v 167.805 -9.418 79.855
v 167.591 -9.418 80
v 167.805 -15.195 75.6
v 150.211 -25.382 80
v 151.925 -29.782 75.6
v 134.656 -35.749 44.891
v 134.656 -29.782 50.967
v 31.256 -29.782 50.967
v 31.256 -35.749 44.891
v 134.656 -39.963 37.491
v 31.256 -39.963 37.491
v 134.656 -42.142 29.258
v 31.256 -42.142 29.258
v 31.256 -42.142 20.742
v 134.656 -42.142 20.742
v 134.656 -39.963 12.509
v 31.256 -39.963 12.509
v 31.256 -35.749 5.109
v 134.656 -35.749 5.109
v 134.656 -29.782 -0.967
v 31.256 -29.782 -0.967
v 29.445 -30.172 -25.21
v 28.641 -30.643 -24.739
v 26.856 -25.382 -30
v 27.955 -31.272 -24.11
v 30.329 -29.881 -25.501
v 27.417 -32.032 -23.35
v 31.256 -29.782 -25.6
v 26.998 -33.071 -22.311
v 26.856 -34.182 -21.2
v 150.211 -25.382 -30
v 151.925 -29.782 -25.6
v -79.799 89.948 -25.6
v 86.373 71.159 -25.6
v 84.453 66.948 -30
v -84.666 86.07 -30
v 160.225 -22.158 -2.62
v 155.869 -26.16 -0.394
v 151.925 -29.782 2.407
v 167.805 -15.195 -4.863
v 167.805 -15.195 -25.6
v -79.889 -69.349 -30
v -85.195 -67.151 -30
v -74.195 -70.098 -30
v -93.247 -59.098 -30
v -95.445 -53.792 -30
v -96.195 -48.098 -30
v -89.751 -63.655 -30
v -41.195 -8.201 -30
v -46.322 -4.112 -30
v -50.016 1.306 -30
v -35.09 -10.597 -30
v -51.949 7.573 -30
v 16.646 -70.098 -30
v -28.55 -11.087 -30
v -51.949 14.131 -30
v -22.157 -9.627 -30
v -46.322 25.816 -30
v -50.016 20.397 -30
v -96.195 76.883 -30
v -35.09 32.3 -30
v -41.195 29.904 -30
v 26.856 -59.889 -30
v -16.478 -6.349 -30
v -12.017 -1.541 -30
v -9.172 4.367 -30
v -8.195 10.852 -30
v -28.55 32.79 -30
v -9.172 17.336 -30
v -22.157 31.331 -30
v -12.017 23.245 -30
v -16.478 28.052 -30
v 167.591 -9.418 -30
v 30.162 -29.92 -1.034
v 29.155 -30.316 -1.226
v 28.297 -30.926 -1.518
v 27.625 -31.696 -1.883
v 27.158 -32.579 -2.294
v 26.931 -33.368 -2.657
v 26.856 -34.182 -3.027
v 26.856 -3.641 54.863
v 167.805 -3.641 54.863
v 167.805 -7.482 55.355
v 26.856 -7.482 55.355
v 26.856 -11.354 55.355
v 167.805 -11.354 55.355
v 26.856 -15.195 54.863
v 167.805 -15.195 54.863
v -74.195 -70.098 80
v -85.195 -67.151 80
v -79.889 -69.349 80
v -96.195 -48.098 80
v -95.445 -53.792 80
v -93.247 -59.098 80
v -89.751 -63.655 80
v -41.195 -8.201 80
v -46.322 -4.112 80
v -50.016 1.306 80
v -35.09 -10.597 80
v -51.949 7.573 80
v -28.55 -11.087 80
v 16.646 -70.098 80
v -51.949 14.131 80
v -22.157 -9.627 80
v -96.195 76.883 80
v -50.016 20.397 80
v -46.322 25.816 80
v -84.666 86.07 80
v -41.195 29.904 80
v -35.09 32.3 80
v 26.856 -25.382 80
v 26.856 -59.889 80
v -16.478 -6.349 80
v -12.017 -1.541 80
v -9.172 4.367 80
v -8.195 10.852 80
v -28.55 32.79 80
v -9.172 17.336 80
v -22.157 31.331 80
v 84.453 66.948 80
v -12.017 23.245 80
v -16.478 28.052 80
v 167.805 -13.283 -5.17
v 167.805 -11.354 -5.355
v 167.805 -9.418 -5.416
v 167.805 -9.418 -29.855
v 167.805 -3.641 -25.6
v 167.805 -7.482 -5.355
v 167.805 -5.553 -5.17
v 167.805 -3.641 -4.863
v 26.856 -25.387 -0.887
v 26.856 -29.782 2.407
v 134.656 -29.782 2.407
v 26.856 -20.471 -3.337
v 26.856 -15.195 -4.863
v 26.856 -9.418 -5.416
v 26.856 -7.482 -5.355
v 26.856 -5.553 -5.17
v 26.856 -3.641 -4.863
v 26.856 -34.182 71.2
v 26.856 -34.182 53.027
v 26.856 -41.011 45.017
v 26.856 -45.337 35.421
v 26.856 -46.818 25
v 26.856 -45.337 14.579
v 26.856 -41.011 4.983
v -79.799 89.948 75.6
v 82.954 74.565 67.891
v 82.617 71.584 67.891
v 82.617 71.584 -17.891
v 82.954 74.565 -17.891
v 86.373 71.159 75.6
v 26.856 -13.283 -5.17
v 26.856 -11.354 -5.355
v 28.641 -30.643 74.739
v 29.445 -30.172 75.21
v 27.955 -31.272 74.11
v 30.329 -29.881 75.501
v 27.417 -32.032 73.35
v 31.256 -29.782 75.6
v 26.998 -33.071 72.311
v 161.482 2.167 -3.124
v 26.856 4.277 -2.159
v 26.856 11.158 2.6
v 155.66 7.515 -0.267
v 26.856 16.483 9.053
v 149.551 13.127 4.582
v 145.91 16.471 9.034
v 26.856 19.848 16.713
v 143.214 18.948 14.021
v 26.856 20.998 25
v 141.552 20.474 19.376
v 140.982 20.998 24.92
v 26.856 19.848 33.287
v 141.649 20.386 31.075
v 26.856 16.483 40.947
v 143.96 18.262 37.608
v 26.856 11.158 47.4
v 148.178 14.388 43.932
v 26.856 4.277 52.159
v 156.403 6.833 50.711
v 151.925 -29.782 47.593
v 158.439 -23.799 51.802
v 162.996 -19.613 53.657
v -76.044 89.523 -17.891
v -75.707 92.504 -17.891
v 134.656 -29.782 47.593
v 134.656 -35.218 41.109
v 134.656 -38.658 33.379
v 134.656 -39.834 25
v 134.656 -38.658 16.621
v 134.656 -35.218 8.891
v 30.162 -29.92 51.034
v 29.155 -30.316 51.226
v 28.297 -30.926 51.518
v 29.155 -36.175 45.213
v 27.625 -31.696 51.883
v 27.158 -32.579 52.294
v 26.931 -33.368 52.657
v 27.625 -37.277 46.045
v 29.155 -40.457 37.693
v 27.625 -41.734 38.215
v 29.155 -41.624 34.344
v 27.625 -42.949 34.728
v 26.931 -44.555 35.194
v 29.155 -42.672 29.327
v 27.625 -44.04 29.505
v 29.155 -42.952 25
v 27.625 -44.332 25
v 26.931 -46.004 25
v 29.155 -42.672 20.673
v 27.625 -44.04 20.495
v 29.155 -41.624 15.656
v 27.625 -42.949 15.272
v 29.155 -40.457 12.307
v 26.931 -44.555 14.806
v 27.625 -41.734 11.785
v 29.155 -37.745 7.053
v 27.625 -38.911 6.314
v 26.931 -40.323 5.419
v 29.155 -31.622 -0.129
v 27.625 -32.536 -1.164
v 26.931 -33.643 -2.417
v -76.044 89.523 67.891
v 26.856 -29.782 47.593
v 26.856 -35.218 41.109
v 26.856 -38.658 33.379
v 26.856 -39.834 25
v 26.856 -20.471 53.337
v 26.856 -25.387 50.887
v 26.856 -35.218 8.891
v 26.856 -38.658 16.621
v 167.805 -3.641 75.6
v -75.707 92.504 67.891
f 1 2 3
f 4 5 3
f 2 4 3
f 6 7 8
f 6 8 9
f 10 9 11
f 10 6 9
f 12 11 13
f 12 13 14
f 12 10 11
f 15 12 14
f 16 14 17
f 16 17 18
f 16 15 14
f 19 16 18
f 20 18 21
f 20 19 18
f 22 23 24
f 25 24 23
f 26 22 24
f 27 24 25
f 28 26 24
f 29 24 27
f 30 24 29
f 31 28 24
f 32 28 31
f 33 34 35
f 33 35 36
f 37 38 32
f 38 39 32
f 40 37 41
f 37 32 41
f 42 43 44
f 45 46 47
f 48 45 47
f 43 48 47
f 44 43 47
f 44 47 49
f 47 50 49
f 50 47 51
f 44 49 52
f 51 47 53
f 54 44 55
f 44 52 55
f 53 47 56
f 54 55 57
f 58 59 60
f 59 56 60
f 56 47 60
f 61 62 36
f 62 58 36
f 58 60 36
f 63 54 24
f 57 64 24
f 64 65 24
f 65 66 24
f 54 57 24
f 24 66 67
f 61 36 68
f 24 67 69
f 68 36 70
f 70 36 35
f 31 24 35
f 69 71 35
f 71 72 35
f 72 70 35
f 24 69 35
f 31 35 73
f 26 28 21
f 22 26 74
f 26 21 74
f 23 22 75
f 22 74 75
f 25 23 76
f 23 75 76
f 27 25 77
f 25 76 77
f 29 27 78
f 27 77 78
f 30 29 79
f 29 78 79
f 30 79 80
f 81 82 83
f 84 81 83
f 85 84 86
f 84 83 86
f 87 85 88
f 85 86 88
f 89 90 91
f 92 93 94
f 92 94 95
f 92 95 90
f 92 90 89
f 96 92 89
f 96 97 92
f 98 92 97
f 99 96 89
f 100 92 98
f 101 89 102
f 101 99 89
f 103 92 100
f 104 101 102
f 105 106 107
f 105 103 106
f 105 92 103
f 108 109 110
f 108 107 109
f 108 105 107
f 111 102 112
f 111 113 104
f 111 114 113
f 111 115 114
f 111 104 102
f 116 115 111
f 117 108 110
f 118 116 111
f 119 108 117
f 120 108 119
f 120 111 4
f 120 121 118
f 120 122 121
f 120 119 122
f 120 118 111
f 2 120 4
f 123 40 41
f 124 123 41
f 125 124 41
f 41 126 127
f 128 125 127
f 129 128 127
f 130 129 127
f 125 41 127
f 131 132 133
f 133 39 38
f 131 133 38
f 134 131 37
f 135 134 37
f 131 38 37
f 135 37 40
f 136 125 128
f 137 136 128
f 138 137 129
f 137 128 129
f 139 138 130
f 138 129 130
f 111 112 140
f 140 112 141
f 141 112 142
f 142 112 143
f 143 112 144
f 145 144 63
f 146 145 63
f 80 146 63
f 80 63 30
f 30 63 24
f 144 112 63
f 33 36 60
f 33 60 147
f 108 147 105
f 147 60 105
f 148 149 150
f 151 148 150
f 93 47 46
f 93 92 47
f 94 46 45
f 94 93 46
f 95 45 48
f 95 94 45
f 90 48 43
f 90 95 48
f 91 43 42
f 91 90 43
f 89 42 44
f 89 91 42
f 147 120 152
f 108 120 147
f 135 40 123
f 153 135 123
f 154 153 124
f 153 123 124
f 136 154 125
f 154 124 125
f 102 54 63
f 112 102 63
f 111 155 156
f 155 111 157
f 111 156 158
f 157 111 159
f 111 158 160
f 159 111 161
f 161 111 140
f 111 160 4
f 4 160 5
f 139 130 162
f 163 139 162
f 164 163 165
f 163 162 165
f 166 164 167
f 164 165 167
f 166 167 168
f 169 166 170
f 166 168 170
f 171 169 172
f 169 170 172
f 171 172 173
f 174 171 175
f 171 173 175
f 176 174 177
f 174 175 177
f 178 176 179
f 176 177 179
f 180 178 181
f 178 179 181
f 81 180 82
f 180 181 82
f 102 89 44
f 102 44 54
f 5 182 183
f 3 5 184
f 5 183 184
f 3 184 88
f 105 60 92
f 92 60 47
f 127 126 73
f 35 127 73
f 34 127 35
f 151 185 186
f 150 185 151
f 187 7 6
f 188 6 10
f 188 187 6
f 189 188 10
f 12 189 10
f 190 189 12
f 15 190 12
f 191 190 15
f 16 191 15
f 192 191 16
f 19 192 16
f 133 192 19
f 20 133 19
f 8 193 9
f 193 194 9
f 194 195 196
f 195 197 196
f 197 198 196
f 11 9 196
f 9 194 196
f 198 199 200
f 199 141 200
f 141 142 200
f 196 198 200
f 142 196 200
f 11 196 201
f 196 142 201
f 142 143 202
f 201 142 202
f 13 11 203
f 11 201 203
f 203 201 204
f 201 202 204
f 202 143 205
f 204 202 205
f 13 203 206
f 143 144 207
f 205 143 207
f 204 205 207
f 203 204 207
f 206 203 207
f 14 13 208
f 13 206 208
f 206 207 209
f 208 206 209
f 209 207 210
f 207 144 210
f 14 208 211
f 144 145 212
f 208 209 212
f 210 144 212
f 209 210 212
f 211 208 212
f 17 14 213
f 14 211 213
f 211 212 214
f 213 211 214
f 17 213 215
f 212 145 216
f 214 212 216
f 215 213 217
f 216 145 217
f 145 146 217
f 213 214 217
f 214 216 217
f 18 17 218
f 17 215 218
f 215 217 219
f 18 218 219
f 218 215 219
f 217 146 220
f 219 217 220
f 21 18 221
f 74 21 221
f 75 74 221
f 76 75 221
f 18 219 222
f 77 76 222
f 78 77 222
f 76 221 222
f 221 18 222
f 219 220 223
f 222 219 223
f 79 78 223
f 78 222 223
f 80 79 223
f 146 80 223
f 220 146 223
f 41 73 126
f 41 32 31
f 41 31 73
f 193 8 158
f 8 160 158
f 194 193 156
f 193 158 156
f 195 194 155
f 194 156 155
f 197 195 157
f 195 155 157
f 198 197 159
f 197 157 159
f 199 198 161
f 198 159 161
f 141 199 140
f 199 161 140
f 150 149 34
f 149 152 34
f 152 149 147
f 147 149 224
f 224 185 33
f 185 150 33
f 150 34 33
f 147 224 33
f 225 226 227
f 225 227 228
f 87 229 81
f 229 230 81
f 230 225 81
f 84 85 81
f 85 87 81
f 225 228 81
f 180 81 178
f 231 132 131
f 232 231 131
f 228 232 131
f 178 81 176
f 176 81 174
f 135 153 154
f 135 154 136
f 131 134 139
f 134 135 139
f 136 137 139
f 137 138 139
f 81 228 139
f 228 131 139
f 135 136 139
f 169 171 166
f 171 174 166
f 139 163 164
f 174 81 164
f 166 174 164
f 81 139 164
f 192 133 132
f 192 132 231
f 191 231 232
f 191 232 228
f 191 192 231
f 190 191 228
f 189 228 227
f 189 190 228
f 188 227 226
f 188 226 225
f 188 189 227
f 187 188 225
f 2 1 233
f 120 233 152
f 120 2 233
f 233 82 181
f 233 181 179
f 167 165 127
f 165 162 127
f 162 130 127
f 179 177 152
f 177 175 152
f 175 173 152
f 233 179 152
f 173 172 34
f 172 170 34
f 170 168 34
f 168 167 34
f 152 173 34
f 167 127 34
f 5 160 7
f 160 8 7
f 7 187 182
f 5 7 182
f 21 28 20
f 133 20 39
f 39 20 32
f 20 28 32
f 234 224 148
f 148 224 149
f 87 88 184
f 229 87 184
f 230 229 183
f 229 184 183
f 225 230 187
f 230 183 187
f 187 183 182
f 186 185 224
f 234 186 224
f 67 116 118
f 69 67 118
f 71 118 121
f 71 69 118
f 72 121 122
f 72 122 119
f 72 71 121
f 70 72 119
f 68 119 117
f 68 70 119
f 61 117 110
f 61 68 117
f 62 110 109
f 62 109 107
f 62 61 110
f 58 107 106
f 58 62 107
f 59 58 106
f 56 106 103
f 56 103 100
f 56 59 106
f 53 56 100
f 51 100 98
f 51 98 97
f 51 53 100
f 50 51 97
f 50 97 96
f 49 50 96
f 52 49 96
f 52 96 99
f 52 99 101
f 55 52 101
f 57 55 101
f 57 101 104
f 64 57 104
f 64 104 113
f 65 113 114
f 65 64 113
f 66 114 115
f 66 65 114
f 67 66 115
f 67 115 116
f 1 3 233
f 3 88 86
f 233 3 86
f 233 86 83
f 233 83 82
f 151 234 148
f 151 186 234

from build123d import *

# Parameters (mm, degrees)
SKETCH2_R           = 10
BOSS_EXTRUDE1_DEPTH = 50
CUT_EXTRUDE1_DEPTH  = 64.068151531
BOSS_EXTRUDE2_START = 49
BOSS_EXTRUDE2_DEPTH = 49
FILLET1_R           = 10
CHAMFER1_SIZE       = 7.5
CHAMFER1_SIZE2      = 6.781071912
CHAMFER2_SIZE       = 2
CHAMFER3_SIZE       = 2
FILLET2_R           = 2
SCALE1_SCALE        = 2
SCALE2_SCALE        = 1.1
SKETCH5_W           = 159.672226339
SKETCH5_H           = 42.890755139
SKETCH5_H_2         = 42.890755138
BOSS_EXTRUDE3_DEPTH = 3


with BuildPart() as part:
    # Sketch2 → Boss-Extrude1 (new body)
    with BuildSketch(Plane.XY):
        Polygon((40.193713233, 38.980676174), (-42.791413838, 48.363568548), (-42.791413838, -25.22727884), (8.499789264, -25.22727884), (13.140434631, -20.586633473), (13.140434631, -6.901832716), (69.990252121, -6.901832716), (77.208586162, -0.271434231), (77.208586162, 4.980676174), align=None)
        with Locations((-12.791413838, 11.568144854)):
            Circle(SKETCH2_R, mode=Mode.SUBTRACT)
    extrude(amount=BOSS_EXTRUDE1_DEPTH)

    # Sketch3 → Cut-Extrude1 (cut)
    with BuildSketch(Plane(origin=(77.208586162, 0, 0), x_dir=(0, 0, -1), z_dir=(1, 0, 0))):
        with BuildLine():
            Line((-38.573939088, 4.980676174), (-25, 4.980676174))
            Line((-25, 4.980676174), (-11.426060912, 4.980676174))
            ThreePointArc((-11.426060912, 4.980676174), (-25, 16.180248925), (-38.573939088, 4.980676174))
        make_face()
        with BuildLine():
            Line((-38.573939088, -0.271434231), (-25, -0.271434231))
            Line((-25, -0.271434231), (-25, 4.980676174))
            Line((-25, 4.980676174), (-38.573939088, 4.980676174))
            ThreePointArc((-38.573939088, 4.980676174), (-38.825627953, 2.354620972), (-38.573939088, -0.271434231))
        make_face()
        with BuildLine():
            Line((-25, 4.980676174), (-25, -0.271434231))
            Line((-25, -0.271434231), (-11.426060912, -0.271434231))
            ThreePointArc((-11.426060912, -0.271434231), (-11.237438102, 1.035576506), (-11.174372047, 2.354620972))
            ThreePointArc((-11.174372047, 2.354620972), (-11.237438102, 3.673665437), (-11.426060912, 4.980676174))
            Line((-11.426060912, 4.980676174), (-25, 4.980676174))
        make_face()
        with BuildLine():
            Line((-11.426060912, -0.271434231), (-25, -0.271434231))
            Line((-25, -0.271434231), (-38.573939088, -0.271434231))
            ThreePointArc((-38.573939088, -0.271434231), (-25, -11.471006981), (-11.426060912, -0.271434231))
        make_face()
    extrude(amount=-CUT_EXTRUDE1_DEPTH, mode=Mode.SUBTRACT)

    # Sketch4 → Boss-Extrude2 (add)
    with BuildSketch(Plane(origin=(13.140434631, 0, 0), x_dir=(0, 0, -1), z_dir=(1, 0, 0)).offset(BOSS_EXTRUDE2_START)):
        with BuildLine():
            Line((-13.196692619, -6.901832716), (-14.730333334, -6.901832716))
            ThreePointArc((-14.730333334, -6.901832716), (-25, -11.471006981), (-35.269666666, -6.901832716))
            Line((-35.269666666, -6.901832716), (-36.803307381, -6.901832716))
            ThreePointArc((-36.803307381, -6.901832716), (-25, -12.645379028), (-13.196692619, -6.901832716))
        make_face()
    extrude(amount=-BOSS_EXTRUDE2_DEPTH)

    # Fillet1
    fillet1_edges = [part.edges().sort_by_distance(p)[0] for p in [
        (-42.791413838, -25.22727884, 25),
    ]]
    fillet(fillet1_edges, radius=FILLET1_R)

    # Chamfer1
    chamfer1_edges = [part.edges().sort_by_distance(p)[0] for p in [
        (-42.791413838, 48.363568548, 25),
    ]]
    chamfer1_side = [part.faces().sort_by_distance(p)[0] for p in [
        (-1.298850303, 43.672122361, 25),
    ]]
    chamfer(chamfer1_edges, length=CHAMFER1_SIZE, length2=CHAMFER1_SIZE2, reference=chamfer1_side[0])

    # Chamfer2
    chamfer2_edges = [part.edges().sort_by_distance(p)[0] for p in [
        (2.427406766, 43.250805069, 0),
        (58.701149697, 21.980676174, 0),
        (58.701149697, 21.980676174, 50),
        (2.427406766, 43.250805069, 50),
    ]]
    chamfer(chamfer2_edges, length=CHAMFER2_SIZE)

    # Chamfer3
    chamfer3_edges = [part.edges().sort_by_distance(p)[0] for p in [
        (41.565343376, -6.901832716, 50),
        (73.599419141, -3.586633473, 50),
        (73.599419141, -3.586633473, 0),
        (41.565343376, -6.901832716, 0),
    ]]
    chamfer(chamfer3_edges, length=CHAMFER3_SIZE)

    # Fillet2
    fillet2_edges = [part.edges().sort_by_distance(p)[0] for p in [
        (13.140434631, -6.901832716, 7.598346309),
        (13.140434631, -12.645379028, 25),
        (13.140434631, -6.901832716, 42.401653691),
    ]]
    fillet(fillet2_edges, radius=FILLET2_R)


with BuildPart() as part_1:
    # Scale1: scaled about (1.71120361, 12.165140941, 25)
    add(part.part.scale(SCALE1_SCALE).moved(Location((-1.71120361, -12.165140941, -25))))


with BuildPart() as part_2:
    # Scale2: scaled about (1.711203609, 12.165140942, 25)
    add(part_1.part.scale(SCALE2_SCALE).moved(Location((-0.171120361, -1.216514094, -2.5))))

    # Sketch5 → Boss-Extrude3 (add)
    with BuildSketch(Plane(origin=(9.034485149, 79.903708601, 0), x_dir=(0.993668551555422, -0.11235127791774192, 0), z_dir=(0.11235127791774194, 0.9936685515554221, 0))):
        with Locations((-5.784473025, -46.445353997)):
            Rectangle(SKETCH5_W, SKETCH5_H)
        with Locations((-5.784473025, -3.554598859)):
            Rectangle(SKETCH5_W, SKETCH5_H_2)
    extrude(amount=BOSS_EXTRUDE3_DEPTH)


solid = part_2.part
